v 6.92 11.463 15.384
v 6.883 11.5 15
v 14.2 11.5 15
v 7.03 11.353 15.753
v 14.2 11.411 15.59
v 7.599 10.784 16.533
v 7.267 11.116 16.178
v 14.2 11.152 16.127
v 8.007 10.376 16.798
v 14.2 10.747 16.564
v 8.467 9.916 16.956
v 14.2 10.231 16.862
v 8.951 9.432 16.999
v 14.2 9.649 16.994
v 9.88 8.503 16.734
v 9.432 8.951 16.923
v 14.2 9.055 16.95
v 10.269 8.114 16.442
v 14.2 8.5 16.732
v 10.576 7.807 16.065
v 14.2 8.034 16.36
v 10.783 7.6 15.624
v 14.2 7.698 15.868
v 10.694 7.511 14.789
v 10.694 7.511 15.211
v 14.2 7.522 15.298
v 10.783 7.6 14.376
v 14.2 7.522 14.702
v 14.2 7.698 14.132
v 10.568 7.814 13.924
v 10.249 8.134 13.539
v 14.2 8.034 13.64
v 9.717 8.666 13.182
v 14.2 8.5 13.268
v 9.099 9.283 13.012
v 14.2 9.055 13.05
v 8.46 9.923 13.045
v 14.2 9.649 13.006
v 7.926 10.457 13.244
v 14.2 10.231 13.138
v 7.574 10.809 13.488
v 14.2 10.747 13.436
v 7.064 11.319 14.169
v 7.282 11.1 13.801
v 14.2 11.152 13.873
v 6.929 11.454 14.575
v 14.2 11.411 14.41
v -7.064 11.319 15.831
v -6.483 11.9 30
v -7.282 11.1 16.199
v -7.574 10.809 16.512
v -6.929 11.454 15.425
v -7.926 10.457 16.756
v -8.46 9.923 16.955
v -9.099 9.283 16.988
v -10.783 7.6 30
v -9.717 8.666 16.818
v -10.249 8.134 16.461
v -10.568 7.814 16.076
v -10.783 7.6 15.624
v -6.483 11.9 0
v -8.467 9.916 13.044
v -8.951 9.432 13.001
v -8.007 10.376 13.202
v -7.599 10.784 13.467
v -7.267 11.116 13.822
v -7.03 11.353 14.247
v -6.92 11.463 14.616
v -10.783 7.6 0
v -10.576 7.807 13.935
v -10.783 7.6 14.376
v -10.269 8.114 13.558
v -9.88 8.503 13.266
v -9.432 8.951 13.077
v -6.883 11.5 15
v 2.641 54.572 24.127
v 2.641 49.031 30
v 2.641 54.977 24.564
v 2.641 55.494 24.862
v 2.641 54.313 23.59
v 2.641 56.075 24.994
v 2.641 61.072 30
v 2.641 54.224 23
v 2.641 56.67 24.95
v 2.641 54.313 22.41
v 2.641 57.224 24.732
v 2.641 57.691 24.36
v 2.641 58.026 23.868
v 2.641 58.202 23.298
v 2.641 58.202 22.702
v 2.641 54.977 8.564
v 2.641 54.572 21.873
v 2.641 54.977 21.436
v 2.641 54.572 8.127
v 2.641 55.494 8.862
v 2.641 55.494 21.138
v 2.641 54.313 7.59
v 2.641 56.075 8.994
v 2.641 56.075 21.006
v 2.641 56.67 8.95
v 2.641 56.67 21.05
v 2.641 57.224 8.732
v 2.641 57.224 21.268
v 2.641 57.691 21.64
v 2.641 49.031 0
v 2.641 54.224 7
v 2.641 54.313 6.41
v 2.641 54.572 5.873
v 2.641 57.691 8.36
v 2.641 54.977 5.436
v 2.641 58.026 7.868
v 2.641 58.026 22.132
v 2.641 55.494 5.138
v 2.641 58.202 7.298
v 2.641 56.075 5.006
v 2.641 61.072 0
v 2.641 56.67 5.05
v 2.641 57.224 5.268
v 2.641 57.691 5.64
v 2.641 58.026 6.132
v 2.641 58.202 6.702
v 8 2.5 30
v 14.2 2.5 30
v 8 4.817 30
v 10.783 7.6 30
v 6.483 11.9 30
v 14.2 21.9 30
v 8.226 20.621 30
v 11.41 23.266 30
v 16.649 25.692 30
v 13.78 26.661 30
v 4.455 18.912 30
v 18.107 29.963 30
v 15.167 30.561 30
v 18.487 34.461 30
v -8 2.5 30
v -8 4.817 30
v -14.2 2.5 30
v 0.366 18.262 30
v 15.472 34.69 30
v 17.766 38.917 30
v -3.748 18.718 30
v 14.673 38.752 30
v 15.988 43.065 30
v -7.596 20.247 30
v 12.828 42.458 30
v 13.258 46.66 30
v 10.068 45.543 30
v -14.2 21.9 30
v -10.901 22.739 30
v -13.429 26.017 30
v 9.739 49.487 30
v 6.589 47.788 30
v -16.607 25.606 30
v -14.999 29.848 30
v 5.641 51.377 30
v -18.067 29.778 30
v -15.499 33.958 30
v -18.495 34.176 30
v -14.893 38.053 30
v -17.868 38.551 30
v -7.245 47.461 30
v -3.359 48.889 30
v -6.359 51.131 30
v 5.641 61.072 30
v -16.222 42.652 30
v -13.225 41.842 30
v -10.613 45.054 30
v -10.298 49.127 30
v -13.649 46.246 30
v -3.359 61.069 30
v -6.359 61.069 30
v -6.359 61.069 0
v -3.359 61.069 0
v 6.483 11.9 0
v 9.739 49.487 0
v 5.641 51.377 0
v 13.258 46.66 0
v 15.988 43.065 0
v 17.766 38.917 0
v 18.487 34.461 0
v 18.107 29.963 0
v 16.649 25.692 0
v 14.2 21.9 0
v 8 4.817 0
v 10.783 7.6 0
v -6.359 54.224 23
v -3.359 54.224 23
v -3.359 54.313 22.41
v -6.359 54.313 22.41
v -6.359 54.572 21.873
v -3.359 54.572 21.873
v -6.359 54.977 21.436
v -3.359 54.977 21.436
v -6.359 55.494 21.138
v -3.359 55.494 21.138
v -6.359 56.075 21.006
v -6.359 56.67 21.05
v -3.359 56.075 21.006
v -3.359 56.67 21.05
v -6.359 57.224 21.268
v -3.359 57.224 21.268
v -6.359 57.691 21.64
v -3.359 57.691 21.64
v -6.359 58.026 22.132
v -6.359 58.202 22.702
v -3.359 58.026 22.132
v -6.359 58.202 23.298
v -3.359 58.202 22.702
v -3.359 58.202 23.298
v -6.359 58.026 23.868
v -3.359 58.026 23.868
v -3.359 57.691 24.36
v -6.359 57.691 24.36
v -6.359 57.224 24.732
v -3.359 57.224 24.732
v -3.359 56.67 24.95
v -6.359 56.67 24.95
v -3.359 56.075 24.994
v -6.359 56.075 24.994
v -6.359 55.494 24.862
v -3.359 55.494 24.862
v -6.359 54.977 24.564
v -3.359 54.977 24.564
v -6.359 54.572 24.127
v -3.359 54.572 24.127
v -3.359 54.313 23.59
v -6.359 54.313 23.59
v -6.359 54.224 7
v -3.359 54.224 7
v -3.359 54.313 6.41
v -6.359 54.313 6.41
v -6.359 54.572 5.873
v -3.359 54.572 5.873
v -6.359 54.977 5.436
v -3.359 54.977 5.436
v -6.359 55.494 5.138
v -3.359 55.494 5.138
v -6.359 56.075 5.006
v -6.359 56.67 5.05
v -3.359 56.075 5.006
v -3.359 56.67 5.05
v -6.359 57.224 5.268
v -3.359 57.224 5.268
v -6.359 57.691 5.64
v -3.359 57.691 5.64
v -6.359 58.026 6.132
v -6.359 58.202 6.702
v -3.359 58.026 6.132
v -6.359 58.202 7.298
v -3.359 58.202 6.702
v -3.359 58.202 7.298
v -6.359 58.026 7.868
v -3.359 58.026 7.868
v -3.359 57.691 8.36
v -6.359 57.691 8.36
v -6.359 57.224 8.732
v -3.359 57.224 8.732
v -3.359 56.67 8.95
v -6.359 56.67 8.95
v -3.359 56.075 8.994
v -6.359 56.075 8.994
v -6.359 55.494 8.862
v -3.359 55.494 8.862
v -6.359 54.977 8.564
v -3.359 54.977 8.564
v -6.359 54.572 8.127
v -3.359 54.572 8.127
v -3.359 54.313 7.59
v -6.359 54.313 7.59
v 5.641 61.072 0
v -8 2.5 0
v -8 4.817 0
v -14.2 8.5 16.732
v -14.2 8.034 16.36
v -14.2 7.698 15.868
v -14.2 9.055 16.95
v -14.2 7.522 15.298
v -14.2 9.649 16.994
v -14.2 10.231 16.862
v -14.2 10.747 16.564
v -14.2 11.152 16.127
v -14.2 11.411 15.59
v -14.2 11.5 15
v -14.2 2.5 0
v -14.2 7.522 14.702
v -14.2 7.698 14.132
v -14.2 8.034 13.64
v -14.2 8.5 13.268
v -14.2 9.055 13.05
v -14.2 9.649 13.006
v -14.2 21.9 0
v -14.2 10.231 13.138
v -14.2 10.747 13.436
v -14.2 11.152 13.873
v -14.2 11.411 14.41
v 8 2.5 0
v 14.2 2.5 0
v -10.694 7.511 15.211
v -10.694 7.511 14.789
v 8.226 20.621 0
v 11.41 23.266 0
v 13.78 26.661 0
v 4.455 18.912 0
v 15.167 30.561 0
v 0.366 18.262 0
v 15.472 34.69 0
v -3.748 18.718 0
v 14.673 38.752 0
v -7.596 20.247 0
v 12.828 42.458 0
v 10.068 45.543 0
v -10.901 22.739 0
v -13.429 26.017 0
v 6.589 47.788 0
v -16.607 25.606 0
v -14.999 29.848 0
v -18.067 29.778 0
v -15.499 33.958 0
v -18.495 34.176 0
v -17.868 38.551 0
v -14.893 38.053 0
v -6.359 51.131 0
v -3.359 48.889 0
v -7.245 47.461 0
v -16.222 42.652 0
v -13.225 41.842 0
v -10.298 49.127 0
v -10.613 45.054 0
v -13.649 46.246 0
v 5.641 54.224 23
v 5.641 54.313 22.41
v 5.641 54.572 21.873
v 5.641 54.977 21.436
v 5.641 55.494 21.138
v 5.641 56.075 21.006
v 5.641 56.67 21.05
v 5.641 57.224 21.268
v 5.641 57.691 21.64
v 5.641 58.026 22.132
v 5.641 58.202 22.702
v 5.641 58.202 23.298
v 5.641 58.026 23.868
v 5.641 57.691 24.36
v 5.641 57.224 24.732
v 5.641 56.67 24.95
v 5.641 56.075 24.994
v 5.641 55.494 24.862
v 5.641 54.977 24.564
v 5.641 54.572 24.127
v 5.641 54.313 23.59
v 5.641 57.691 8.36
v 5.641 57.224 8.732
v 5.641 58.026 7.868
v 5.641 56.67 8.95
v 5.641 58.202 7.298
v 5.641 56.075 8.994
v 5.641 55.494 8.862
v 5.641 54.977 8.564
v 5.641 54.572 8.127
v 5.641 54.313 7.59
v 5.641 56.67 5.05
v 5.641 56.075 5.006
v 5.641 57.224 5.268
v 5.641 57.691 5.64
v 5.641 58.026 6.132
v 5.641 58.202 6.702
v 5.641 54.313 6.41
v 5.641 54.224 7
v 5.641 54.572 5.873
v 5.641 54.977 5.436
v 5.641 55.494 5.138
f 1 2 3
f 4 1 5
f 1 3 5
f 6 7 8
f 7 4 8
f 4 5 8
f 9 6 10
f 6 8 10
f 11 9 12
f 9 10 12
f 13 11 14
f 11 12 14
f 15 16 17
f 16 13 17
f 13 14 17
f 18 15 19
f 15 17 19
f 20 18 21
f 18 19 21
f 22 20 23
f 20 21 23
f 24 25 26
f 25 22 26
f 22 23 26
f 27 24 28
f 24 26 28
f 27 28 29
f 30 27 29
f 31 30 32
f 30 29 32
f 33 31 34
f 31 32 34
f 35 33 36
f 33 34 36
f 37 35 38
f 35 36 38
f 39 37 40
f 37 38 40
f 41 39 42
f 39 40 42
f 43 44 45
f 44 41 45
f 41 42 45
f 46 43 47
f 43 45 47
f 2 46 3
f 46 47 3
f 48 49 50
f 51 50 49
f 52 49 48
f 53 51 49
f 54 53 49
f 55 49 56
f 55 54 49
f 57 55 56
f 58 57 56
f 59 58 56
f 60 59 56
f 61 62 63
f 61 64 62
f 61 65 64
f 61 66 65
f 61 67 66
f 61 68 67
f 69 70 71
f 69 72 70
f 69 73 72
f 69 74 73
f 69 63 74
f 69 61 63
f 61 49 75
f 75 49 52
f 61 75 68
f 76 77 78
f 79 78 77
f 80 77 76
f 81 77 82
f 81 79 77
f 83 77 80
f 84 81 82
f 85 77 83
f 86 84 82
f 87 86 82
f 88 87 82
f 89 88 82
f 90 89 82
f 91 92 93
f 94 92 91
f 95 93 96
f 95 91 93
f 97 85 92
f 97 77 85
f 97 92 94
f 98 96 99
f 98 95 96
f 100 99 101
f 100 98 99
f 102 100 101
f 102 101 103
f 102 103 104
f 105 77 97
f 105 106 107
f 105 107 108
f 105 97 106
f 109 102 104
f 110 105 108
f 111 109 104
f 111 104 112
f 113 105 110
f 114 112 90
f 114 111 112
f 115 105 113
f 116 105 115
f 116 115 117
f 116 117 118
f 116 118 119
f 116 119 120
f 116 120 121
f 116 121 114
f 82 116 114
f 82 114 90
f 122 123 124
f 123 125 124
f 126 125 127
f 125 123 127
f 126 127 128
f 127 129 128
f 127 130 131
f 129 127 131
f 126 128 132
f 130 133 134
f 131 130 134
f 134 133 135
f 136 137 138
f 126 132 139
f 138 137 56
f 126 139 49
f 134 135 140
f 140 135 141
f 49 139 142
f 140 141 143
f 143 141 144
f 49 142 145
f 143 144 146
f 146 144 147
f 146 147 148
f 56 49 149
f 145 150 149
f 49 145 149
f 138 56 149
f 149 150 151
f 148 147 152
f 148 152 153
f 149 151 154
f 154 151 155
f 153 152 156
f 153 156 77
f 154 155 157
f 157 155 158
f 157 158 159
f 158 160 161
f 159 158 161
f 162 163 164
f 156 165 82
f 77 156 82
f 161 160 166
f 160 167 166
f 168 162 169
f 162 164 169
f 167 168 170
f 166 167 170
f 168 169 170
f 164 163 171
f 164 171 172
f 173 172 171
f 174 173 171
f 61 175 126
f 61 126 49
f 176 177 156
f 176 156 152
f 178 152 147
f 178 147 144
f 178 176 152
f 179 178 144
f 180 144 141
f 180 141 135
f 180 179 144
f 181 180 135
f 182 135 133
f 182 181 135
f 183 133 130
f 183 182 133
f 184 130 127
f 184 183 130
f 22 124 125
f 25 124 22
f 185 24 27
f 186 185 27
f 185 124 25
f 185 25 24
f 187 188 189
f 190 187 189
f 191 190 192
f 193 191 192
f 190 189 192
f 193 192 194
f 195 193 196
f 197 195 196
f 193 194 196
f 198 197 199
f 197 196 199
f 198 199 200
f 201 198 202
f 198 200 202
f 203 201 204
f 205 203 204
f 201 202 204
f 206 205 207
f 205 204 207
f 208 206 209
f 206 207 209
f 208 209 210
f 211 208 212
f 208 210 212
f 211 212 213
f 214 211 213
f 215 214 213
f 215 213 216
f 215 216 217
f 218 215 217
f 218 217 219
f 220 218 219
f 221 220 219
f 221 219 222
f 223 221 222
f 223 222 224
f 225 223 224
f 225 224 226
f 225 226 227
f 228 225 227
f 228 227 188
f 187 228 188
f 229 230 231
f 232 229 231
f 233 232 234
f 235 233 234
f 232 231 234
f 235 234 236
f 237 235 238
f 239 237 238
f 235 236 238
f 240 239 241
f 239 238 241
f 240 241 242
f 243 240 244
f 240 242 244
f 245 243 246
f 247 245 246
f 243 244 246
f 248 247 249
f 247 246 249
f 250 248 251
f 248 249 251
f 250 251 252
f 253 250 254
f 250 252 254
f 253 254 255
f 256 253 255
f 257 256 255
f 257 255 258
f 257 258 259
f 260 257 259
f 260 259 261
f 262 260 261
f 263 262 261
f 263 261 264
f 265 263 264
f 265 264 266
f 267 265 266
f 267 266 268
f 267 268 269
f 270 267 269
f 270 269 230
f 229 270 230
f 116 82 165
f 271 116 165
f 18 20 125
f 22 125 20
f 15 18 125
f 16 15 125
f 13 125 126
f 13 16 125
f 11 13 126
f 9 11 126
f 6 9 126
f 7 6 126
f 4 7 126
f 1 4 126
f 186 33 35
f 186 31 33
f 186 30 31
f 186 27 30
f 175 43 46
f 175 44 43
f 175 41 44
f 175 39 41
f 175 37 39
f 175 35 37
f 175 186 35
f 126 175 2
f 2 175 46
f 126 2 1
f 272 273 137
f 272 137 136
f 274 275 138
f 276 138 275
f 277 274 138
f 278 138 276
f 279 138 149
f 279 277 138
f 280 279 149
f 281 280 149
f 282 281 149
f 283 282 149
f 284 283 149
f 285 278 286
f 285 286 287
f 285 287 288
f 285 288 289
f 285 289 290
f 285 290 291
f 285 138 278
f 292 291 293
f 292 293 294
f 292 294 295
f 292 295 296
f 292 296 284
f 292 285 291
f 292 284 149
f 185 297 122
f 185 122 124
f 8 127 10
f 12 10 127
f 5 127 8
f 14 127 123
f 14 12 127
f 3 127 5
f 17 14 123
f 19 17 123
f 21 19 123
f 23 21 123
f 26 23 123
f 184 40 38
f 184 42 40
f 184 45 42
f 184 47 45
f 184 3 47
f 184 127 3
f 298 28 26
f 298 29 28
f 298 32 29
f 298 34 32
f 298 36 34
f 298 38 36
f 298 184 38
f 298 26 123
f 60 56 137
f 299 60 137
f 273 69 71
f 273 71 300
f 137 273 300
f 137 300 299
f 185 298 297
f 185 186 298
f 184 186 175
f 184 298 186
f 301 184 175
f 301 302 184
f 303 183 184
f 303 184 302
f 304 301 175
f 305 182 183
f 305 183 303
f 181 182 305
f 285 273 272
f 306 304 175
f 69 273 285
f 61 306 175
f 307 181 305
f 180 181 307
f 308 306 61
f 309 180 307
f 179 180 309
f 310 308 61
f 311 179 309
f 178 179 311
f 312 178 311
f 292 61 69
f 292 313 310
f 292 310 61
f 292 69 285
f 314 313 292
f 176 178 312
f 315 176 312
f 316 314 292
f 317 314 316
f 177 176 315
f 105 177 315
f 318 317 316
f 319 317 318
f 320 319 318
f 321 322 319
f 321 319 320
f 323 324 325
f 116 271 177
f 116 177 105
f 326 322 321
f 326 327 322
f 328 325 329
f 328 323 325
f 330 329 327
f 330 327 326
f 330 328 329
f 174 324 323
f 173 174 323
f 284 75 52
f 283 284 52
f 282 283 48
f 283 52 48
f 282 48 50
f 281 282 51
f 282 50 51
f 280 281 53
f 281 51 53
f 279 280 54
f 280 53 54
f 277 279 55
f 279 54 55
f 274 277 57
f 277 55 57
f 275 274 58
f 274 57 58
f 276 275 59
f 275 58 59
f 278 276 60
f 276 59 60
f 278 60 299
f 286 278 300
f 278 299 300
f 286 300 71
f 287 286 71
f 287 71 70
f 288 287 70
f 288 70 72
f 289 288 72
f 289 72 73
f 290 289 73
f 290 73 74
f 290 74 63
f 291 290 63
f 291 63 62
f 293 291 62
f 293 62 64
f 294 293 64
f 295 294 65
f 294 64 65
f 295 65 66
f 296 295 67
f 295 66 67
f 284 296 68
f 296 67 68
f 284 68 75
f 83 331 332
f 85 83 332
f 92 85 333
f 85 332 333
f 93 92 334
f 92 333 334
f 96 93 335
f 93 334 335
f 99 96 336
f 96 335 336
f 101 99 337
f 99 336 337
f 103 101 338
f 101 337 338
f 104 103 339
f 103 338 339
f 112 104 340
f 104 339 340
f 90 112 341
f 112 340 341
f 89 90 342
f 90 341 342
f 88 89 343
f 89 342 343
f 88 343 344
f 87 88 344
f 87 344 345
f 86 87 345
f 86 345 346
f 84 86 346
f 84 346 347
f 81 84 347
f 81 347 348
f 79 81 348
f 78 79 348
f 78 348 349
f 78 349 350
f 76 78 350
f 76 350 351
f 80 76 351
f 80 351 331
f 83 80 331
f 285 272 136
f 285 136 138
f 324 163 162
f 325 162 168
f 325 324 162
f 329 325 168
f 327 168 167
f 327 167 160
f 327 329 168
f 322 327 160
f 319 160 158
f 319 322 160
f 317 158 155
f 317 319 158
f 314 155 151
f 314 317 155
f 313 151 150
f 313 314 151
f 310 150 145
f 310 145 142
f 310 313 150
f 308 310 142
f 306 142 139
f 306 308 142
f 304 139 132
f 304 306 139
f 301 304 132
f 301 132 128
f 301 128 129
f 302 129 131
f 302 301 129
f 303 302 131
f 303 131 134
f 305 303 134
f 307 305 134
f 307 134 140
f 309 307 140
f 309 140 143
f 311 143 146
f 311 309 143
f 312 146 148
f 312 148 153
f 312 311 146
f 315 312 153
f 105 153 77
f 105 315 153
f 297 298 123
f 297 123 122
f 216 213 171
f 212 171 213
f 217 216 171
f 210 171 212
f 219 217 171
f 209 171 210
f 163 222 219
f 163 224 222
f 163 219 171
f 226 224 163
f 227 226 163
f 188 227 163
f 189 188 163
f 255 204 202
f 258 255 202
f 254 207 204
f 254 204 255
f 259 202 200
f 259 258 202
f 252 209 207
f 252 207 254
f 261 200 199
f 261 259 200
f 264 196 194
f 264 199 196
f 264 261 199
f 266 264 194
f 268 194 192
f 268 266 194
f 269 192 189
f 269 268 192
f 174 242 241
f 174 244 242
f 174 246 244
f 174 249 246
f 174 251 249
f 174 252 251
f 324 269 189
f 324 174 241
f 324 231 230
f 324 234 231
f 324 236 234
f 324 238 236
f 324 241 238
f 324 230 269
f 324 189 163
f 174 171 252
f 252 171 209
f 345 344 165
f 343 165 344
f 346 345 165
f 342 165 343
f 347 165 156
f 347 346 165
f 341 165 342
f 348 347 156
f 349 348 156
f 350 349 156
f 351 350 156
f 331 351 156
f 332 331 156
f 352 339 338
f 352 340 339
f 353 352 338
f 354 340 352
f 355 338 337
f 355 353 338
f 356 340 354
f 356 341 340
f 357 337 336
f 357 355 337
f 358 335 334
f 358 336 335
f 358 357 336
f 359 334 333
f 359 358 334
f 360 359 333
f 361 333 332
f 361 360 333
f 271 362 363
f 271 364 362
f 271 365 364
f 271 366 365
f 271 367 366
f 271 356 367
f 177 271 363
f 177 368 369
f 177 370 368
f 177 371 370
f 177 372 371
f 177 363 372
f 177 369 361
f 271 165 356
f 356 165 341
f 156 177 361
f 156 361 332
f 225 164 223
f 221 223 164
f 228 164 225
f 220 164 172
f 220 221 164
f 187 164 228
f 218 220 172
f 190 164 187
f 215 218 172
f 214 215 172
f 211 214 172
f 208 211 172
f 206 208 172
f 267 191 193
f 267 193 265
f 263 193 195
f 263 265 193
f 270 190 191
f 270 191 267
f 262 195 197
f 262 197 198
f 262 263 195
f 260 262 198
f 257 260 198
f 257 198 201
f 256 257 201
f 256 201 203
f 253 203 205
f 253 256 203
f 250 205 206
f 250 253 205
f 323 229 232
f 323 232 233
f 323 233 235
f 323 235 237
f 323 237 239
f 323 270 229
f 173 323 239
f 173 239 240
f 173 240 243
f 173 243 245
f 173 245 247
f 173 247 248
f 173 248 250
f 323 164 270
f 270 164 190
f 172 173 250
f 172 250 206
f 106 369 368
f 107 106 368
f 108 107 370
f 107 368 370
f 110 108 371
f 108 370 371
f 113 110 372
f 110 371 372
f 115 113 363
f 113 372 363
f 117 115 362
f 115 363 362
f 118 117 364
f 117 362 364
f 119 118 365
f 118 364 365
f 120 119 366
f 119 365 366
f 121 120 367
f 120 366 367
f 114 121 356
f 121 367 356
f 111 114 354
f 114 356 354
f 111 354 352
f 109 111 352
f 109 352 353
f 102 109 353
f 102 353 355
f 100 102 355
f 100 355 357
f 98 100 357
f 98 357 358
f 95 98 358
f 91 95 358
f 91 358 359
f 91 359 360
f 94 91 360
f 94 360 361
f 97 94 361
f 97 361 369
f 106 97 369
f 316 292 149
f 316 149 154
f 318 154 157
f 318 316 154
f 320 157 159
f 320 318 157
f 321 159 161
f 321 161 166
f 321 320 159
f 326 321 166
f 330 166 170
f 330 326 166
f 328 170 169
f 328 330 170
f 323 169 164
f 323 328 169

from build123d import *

# Parameters (mm, degrees)
BOSS_EXTRUDE1_DEPTH = 30
SKETCH2_R           = 2
CUT_EXTRUDE1_DEPTH  = 25.140587276
SKETCH3_R           = 2
CUT_EXTRUDE2_DEPTH  = 33.7


with BuildPart() as part:
    # Sketch1 → Boss-Extrude1 (new body)
    with BuildSketch(Plane.XY):
        with BuildLine():
            Line((2.640587276, 55.058478526), (2.640587276, 61.071909479))
            Line((2.640587276, 61.071909479), (5.640587276, 61.071909479))
            Line((5.640587276, 61.071909479), (5.640587276, 51.377039696))
            ThreePointArc((5.640587276, 51.377039696), (17.766153021, 38.916765877), (14.2, 21.9))
            Line((14.2, 21.9), (14.2, 2.5))
            Line((14.2, 2.5), (11.082842712, 2.5))
            Line((11.082842712, 2.5), (8, 2.5))
            Line((8, 2.5), (8, 4.817157288))
            Line((8, 4.817157288), (10.782842712, 7.6))
            Line((10.782842712, 7.6), (6.482842712, 11.9))
            Line((6.482842712, 11.9), (-6.482842712, 11.9))
            Line((-6.482842712, 11.9), (-10.782842712, 7.6))
            Line((-10.782842712, 7.6), (-8, 4.817157288))
            Line((-8, 4.817157288), (-8, 2.5))
            Line((-8, 2.5), (-11.082842712, 2.5))
            Line((-11.082842712, 2.5), (-14.2, 2.5))
            Line((-14.2, 2.5), (-14.2, 21.9))
            ThreePointArc((-14.2, 21.9), (-17.868360087, 38.550789704), (-6.359412724, 51.130527146))
            Line((-6.359412724, 51.130527146), (-6.359412724, 61.069189213))
            Line((-6.359412724, 61.069189213), (-3.359412724, 61.069189213))
            Line((-3.359412724, 61.069189213), (-3.359412724, 55.069189213))
            Line((-3.359412724, 55.069189213), (-3.359412724, 48.889476621))
            ThreePointArc((-3.359412724, 48.889476621), (0.366343929, 18.262238644), (2.640587276, 49.0313268))
            Line((2.640587276, 49.0313268), (2.640587276, 55.058478526))
        make_face()
    extrude(amount=BOSS_EXTRUDE1_DEPTH)

    # Sketch2 → Cut-Extrude1 (cut, through all)
    with BuildSketch(Plane(origin=(5.640587276, 0, 0), x_dir=(0, 0, -1), z_dir=(1, 0, 0))):
        with Locations(Location((-7, 56.224474587, 0), (0, 0, 270))):  # turned: the seam where the file's is
            Circle(SKETCH2_R)
        with Locations(Location((-23, 56.224474587, 0), (0, 0, 270))):  # turned: the seam where the file's is
            Circle(SKETCH2_R)
    extrude(amount=-CUT_EXTRUDE1_DEPTH, mode=Mode.SUBTRACT)

    # Sketch3 → Cut-Extrude2 (cut, through all)
    with BuildSketch(Plane(origin=(14.2, 0, 0), x_dir=(0, 0, -1), z_dir=(1, 0, 0))):
        with Locations(Location((-15, 9.5, 0), (0, 0, 90))):  # turned: the seam where the file's is
            Circle(SKETCH3_R)
    extrude(amount=-CUT_EXTRUDE2_DEPTH, mode=Mode.SUBTRACT)


solid = part.part
